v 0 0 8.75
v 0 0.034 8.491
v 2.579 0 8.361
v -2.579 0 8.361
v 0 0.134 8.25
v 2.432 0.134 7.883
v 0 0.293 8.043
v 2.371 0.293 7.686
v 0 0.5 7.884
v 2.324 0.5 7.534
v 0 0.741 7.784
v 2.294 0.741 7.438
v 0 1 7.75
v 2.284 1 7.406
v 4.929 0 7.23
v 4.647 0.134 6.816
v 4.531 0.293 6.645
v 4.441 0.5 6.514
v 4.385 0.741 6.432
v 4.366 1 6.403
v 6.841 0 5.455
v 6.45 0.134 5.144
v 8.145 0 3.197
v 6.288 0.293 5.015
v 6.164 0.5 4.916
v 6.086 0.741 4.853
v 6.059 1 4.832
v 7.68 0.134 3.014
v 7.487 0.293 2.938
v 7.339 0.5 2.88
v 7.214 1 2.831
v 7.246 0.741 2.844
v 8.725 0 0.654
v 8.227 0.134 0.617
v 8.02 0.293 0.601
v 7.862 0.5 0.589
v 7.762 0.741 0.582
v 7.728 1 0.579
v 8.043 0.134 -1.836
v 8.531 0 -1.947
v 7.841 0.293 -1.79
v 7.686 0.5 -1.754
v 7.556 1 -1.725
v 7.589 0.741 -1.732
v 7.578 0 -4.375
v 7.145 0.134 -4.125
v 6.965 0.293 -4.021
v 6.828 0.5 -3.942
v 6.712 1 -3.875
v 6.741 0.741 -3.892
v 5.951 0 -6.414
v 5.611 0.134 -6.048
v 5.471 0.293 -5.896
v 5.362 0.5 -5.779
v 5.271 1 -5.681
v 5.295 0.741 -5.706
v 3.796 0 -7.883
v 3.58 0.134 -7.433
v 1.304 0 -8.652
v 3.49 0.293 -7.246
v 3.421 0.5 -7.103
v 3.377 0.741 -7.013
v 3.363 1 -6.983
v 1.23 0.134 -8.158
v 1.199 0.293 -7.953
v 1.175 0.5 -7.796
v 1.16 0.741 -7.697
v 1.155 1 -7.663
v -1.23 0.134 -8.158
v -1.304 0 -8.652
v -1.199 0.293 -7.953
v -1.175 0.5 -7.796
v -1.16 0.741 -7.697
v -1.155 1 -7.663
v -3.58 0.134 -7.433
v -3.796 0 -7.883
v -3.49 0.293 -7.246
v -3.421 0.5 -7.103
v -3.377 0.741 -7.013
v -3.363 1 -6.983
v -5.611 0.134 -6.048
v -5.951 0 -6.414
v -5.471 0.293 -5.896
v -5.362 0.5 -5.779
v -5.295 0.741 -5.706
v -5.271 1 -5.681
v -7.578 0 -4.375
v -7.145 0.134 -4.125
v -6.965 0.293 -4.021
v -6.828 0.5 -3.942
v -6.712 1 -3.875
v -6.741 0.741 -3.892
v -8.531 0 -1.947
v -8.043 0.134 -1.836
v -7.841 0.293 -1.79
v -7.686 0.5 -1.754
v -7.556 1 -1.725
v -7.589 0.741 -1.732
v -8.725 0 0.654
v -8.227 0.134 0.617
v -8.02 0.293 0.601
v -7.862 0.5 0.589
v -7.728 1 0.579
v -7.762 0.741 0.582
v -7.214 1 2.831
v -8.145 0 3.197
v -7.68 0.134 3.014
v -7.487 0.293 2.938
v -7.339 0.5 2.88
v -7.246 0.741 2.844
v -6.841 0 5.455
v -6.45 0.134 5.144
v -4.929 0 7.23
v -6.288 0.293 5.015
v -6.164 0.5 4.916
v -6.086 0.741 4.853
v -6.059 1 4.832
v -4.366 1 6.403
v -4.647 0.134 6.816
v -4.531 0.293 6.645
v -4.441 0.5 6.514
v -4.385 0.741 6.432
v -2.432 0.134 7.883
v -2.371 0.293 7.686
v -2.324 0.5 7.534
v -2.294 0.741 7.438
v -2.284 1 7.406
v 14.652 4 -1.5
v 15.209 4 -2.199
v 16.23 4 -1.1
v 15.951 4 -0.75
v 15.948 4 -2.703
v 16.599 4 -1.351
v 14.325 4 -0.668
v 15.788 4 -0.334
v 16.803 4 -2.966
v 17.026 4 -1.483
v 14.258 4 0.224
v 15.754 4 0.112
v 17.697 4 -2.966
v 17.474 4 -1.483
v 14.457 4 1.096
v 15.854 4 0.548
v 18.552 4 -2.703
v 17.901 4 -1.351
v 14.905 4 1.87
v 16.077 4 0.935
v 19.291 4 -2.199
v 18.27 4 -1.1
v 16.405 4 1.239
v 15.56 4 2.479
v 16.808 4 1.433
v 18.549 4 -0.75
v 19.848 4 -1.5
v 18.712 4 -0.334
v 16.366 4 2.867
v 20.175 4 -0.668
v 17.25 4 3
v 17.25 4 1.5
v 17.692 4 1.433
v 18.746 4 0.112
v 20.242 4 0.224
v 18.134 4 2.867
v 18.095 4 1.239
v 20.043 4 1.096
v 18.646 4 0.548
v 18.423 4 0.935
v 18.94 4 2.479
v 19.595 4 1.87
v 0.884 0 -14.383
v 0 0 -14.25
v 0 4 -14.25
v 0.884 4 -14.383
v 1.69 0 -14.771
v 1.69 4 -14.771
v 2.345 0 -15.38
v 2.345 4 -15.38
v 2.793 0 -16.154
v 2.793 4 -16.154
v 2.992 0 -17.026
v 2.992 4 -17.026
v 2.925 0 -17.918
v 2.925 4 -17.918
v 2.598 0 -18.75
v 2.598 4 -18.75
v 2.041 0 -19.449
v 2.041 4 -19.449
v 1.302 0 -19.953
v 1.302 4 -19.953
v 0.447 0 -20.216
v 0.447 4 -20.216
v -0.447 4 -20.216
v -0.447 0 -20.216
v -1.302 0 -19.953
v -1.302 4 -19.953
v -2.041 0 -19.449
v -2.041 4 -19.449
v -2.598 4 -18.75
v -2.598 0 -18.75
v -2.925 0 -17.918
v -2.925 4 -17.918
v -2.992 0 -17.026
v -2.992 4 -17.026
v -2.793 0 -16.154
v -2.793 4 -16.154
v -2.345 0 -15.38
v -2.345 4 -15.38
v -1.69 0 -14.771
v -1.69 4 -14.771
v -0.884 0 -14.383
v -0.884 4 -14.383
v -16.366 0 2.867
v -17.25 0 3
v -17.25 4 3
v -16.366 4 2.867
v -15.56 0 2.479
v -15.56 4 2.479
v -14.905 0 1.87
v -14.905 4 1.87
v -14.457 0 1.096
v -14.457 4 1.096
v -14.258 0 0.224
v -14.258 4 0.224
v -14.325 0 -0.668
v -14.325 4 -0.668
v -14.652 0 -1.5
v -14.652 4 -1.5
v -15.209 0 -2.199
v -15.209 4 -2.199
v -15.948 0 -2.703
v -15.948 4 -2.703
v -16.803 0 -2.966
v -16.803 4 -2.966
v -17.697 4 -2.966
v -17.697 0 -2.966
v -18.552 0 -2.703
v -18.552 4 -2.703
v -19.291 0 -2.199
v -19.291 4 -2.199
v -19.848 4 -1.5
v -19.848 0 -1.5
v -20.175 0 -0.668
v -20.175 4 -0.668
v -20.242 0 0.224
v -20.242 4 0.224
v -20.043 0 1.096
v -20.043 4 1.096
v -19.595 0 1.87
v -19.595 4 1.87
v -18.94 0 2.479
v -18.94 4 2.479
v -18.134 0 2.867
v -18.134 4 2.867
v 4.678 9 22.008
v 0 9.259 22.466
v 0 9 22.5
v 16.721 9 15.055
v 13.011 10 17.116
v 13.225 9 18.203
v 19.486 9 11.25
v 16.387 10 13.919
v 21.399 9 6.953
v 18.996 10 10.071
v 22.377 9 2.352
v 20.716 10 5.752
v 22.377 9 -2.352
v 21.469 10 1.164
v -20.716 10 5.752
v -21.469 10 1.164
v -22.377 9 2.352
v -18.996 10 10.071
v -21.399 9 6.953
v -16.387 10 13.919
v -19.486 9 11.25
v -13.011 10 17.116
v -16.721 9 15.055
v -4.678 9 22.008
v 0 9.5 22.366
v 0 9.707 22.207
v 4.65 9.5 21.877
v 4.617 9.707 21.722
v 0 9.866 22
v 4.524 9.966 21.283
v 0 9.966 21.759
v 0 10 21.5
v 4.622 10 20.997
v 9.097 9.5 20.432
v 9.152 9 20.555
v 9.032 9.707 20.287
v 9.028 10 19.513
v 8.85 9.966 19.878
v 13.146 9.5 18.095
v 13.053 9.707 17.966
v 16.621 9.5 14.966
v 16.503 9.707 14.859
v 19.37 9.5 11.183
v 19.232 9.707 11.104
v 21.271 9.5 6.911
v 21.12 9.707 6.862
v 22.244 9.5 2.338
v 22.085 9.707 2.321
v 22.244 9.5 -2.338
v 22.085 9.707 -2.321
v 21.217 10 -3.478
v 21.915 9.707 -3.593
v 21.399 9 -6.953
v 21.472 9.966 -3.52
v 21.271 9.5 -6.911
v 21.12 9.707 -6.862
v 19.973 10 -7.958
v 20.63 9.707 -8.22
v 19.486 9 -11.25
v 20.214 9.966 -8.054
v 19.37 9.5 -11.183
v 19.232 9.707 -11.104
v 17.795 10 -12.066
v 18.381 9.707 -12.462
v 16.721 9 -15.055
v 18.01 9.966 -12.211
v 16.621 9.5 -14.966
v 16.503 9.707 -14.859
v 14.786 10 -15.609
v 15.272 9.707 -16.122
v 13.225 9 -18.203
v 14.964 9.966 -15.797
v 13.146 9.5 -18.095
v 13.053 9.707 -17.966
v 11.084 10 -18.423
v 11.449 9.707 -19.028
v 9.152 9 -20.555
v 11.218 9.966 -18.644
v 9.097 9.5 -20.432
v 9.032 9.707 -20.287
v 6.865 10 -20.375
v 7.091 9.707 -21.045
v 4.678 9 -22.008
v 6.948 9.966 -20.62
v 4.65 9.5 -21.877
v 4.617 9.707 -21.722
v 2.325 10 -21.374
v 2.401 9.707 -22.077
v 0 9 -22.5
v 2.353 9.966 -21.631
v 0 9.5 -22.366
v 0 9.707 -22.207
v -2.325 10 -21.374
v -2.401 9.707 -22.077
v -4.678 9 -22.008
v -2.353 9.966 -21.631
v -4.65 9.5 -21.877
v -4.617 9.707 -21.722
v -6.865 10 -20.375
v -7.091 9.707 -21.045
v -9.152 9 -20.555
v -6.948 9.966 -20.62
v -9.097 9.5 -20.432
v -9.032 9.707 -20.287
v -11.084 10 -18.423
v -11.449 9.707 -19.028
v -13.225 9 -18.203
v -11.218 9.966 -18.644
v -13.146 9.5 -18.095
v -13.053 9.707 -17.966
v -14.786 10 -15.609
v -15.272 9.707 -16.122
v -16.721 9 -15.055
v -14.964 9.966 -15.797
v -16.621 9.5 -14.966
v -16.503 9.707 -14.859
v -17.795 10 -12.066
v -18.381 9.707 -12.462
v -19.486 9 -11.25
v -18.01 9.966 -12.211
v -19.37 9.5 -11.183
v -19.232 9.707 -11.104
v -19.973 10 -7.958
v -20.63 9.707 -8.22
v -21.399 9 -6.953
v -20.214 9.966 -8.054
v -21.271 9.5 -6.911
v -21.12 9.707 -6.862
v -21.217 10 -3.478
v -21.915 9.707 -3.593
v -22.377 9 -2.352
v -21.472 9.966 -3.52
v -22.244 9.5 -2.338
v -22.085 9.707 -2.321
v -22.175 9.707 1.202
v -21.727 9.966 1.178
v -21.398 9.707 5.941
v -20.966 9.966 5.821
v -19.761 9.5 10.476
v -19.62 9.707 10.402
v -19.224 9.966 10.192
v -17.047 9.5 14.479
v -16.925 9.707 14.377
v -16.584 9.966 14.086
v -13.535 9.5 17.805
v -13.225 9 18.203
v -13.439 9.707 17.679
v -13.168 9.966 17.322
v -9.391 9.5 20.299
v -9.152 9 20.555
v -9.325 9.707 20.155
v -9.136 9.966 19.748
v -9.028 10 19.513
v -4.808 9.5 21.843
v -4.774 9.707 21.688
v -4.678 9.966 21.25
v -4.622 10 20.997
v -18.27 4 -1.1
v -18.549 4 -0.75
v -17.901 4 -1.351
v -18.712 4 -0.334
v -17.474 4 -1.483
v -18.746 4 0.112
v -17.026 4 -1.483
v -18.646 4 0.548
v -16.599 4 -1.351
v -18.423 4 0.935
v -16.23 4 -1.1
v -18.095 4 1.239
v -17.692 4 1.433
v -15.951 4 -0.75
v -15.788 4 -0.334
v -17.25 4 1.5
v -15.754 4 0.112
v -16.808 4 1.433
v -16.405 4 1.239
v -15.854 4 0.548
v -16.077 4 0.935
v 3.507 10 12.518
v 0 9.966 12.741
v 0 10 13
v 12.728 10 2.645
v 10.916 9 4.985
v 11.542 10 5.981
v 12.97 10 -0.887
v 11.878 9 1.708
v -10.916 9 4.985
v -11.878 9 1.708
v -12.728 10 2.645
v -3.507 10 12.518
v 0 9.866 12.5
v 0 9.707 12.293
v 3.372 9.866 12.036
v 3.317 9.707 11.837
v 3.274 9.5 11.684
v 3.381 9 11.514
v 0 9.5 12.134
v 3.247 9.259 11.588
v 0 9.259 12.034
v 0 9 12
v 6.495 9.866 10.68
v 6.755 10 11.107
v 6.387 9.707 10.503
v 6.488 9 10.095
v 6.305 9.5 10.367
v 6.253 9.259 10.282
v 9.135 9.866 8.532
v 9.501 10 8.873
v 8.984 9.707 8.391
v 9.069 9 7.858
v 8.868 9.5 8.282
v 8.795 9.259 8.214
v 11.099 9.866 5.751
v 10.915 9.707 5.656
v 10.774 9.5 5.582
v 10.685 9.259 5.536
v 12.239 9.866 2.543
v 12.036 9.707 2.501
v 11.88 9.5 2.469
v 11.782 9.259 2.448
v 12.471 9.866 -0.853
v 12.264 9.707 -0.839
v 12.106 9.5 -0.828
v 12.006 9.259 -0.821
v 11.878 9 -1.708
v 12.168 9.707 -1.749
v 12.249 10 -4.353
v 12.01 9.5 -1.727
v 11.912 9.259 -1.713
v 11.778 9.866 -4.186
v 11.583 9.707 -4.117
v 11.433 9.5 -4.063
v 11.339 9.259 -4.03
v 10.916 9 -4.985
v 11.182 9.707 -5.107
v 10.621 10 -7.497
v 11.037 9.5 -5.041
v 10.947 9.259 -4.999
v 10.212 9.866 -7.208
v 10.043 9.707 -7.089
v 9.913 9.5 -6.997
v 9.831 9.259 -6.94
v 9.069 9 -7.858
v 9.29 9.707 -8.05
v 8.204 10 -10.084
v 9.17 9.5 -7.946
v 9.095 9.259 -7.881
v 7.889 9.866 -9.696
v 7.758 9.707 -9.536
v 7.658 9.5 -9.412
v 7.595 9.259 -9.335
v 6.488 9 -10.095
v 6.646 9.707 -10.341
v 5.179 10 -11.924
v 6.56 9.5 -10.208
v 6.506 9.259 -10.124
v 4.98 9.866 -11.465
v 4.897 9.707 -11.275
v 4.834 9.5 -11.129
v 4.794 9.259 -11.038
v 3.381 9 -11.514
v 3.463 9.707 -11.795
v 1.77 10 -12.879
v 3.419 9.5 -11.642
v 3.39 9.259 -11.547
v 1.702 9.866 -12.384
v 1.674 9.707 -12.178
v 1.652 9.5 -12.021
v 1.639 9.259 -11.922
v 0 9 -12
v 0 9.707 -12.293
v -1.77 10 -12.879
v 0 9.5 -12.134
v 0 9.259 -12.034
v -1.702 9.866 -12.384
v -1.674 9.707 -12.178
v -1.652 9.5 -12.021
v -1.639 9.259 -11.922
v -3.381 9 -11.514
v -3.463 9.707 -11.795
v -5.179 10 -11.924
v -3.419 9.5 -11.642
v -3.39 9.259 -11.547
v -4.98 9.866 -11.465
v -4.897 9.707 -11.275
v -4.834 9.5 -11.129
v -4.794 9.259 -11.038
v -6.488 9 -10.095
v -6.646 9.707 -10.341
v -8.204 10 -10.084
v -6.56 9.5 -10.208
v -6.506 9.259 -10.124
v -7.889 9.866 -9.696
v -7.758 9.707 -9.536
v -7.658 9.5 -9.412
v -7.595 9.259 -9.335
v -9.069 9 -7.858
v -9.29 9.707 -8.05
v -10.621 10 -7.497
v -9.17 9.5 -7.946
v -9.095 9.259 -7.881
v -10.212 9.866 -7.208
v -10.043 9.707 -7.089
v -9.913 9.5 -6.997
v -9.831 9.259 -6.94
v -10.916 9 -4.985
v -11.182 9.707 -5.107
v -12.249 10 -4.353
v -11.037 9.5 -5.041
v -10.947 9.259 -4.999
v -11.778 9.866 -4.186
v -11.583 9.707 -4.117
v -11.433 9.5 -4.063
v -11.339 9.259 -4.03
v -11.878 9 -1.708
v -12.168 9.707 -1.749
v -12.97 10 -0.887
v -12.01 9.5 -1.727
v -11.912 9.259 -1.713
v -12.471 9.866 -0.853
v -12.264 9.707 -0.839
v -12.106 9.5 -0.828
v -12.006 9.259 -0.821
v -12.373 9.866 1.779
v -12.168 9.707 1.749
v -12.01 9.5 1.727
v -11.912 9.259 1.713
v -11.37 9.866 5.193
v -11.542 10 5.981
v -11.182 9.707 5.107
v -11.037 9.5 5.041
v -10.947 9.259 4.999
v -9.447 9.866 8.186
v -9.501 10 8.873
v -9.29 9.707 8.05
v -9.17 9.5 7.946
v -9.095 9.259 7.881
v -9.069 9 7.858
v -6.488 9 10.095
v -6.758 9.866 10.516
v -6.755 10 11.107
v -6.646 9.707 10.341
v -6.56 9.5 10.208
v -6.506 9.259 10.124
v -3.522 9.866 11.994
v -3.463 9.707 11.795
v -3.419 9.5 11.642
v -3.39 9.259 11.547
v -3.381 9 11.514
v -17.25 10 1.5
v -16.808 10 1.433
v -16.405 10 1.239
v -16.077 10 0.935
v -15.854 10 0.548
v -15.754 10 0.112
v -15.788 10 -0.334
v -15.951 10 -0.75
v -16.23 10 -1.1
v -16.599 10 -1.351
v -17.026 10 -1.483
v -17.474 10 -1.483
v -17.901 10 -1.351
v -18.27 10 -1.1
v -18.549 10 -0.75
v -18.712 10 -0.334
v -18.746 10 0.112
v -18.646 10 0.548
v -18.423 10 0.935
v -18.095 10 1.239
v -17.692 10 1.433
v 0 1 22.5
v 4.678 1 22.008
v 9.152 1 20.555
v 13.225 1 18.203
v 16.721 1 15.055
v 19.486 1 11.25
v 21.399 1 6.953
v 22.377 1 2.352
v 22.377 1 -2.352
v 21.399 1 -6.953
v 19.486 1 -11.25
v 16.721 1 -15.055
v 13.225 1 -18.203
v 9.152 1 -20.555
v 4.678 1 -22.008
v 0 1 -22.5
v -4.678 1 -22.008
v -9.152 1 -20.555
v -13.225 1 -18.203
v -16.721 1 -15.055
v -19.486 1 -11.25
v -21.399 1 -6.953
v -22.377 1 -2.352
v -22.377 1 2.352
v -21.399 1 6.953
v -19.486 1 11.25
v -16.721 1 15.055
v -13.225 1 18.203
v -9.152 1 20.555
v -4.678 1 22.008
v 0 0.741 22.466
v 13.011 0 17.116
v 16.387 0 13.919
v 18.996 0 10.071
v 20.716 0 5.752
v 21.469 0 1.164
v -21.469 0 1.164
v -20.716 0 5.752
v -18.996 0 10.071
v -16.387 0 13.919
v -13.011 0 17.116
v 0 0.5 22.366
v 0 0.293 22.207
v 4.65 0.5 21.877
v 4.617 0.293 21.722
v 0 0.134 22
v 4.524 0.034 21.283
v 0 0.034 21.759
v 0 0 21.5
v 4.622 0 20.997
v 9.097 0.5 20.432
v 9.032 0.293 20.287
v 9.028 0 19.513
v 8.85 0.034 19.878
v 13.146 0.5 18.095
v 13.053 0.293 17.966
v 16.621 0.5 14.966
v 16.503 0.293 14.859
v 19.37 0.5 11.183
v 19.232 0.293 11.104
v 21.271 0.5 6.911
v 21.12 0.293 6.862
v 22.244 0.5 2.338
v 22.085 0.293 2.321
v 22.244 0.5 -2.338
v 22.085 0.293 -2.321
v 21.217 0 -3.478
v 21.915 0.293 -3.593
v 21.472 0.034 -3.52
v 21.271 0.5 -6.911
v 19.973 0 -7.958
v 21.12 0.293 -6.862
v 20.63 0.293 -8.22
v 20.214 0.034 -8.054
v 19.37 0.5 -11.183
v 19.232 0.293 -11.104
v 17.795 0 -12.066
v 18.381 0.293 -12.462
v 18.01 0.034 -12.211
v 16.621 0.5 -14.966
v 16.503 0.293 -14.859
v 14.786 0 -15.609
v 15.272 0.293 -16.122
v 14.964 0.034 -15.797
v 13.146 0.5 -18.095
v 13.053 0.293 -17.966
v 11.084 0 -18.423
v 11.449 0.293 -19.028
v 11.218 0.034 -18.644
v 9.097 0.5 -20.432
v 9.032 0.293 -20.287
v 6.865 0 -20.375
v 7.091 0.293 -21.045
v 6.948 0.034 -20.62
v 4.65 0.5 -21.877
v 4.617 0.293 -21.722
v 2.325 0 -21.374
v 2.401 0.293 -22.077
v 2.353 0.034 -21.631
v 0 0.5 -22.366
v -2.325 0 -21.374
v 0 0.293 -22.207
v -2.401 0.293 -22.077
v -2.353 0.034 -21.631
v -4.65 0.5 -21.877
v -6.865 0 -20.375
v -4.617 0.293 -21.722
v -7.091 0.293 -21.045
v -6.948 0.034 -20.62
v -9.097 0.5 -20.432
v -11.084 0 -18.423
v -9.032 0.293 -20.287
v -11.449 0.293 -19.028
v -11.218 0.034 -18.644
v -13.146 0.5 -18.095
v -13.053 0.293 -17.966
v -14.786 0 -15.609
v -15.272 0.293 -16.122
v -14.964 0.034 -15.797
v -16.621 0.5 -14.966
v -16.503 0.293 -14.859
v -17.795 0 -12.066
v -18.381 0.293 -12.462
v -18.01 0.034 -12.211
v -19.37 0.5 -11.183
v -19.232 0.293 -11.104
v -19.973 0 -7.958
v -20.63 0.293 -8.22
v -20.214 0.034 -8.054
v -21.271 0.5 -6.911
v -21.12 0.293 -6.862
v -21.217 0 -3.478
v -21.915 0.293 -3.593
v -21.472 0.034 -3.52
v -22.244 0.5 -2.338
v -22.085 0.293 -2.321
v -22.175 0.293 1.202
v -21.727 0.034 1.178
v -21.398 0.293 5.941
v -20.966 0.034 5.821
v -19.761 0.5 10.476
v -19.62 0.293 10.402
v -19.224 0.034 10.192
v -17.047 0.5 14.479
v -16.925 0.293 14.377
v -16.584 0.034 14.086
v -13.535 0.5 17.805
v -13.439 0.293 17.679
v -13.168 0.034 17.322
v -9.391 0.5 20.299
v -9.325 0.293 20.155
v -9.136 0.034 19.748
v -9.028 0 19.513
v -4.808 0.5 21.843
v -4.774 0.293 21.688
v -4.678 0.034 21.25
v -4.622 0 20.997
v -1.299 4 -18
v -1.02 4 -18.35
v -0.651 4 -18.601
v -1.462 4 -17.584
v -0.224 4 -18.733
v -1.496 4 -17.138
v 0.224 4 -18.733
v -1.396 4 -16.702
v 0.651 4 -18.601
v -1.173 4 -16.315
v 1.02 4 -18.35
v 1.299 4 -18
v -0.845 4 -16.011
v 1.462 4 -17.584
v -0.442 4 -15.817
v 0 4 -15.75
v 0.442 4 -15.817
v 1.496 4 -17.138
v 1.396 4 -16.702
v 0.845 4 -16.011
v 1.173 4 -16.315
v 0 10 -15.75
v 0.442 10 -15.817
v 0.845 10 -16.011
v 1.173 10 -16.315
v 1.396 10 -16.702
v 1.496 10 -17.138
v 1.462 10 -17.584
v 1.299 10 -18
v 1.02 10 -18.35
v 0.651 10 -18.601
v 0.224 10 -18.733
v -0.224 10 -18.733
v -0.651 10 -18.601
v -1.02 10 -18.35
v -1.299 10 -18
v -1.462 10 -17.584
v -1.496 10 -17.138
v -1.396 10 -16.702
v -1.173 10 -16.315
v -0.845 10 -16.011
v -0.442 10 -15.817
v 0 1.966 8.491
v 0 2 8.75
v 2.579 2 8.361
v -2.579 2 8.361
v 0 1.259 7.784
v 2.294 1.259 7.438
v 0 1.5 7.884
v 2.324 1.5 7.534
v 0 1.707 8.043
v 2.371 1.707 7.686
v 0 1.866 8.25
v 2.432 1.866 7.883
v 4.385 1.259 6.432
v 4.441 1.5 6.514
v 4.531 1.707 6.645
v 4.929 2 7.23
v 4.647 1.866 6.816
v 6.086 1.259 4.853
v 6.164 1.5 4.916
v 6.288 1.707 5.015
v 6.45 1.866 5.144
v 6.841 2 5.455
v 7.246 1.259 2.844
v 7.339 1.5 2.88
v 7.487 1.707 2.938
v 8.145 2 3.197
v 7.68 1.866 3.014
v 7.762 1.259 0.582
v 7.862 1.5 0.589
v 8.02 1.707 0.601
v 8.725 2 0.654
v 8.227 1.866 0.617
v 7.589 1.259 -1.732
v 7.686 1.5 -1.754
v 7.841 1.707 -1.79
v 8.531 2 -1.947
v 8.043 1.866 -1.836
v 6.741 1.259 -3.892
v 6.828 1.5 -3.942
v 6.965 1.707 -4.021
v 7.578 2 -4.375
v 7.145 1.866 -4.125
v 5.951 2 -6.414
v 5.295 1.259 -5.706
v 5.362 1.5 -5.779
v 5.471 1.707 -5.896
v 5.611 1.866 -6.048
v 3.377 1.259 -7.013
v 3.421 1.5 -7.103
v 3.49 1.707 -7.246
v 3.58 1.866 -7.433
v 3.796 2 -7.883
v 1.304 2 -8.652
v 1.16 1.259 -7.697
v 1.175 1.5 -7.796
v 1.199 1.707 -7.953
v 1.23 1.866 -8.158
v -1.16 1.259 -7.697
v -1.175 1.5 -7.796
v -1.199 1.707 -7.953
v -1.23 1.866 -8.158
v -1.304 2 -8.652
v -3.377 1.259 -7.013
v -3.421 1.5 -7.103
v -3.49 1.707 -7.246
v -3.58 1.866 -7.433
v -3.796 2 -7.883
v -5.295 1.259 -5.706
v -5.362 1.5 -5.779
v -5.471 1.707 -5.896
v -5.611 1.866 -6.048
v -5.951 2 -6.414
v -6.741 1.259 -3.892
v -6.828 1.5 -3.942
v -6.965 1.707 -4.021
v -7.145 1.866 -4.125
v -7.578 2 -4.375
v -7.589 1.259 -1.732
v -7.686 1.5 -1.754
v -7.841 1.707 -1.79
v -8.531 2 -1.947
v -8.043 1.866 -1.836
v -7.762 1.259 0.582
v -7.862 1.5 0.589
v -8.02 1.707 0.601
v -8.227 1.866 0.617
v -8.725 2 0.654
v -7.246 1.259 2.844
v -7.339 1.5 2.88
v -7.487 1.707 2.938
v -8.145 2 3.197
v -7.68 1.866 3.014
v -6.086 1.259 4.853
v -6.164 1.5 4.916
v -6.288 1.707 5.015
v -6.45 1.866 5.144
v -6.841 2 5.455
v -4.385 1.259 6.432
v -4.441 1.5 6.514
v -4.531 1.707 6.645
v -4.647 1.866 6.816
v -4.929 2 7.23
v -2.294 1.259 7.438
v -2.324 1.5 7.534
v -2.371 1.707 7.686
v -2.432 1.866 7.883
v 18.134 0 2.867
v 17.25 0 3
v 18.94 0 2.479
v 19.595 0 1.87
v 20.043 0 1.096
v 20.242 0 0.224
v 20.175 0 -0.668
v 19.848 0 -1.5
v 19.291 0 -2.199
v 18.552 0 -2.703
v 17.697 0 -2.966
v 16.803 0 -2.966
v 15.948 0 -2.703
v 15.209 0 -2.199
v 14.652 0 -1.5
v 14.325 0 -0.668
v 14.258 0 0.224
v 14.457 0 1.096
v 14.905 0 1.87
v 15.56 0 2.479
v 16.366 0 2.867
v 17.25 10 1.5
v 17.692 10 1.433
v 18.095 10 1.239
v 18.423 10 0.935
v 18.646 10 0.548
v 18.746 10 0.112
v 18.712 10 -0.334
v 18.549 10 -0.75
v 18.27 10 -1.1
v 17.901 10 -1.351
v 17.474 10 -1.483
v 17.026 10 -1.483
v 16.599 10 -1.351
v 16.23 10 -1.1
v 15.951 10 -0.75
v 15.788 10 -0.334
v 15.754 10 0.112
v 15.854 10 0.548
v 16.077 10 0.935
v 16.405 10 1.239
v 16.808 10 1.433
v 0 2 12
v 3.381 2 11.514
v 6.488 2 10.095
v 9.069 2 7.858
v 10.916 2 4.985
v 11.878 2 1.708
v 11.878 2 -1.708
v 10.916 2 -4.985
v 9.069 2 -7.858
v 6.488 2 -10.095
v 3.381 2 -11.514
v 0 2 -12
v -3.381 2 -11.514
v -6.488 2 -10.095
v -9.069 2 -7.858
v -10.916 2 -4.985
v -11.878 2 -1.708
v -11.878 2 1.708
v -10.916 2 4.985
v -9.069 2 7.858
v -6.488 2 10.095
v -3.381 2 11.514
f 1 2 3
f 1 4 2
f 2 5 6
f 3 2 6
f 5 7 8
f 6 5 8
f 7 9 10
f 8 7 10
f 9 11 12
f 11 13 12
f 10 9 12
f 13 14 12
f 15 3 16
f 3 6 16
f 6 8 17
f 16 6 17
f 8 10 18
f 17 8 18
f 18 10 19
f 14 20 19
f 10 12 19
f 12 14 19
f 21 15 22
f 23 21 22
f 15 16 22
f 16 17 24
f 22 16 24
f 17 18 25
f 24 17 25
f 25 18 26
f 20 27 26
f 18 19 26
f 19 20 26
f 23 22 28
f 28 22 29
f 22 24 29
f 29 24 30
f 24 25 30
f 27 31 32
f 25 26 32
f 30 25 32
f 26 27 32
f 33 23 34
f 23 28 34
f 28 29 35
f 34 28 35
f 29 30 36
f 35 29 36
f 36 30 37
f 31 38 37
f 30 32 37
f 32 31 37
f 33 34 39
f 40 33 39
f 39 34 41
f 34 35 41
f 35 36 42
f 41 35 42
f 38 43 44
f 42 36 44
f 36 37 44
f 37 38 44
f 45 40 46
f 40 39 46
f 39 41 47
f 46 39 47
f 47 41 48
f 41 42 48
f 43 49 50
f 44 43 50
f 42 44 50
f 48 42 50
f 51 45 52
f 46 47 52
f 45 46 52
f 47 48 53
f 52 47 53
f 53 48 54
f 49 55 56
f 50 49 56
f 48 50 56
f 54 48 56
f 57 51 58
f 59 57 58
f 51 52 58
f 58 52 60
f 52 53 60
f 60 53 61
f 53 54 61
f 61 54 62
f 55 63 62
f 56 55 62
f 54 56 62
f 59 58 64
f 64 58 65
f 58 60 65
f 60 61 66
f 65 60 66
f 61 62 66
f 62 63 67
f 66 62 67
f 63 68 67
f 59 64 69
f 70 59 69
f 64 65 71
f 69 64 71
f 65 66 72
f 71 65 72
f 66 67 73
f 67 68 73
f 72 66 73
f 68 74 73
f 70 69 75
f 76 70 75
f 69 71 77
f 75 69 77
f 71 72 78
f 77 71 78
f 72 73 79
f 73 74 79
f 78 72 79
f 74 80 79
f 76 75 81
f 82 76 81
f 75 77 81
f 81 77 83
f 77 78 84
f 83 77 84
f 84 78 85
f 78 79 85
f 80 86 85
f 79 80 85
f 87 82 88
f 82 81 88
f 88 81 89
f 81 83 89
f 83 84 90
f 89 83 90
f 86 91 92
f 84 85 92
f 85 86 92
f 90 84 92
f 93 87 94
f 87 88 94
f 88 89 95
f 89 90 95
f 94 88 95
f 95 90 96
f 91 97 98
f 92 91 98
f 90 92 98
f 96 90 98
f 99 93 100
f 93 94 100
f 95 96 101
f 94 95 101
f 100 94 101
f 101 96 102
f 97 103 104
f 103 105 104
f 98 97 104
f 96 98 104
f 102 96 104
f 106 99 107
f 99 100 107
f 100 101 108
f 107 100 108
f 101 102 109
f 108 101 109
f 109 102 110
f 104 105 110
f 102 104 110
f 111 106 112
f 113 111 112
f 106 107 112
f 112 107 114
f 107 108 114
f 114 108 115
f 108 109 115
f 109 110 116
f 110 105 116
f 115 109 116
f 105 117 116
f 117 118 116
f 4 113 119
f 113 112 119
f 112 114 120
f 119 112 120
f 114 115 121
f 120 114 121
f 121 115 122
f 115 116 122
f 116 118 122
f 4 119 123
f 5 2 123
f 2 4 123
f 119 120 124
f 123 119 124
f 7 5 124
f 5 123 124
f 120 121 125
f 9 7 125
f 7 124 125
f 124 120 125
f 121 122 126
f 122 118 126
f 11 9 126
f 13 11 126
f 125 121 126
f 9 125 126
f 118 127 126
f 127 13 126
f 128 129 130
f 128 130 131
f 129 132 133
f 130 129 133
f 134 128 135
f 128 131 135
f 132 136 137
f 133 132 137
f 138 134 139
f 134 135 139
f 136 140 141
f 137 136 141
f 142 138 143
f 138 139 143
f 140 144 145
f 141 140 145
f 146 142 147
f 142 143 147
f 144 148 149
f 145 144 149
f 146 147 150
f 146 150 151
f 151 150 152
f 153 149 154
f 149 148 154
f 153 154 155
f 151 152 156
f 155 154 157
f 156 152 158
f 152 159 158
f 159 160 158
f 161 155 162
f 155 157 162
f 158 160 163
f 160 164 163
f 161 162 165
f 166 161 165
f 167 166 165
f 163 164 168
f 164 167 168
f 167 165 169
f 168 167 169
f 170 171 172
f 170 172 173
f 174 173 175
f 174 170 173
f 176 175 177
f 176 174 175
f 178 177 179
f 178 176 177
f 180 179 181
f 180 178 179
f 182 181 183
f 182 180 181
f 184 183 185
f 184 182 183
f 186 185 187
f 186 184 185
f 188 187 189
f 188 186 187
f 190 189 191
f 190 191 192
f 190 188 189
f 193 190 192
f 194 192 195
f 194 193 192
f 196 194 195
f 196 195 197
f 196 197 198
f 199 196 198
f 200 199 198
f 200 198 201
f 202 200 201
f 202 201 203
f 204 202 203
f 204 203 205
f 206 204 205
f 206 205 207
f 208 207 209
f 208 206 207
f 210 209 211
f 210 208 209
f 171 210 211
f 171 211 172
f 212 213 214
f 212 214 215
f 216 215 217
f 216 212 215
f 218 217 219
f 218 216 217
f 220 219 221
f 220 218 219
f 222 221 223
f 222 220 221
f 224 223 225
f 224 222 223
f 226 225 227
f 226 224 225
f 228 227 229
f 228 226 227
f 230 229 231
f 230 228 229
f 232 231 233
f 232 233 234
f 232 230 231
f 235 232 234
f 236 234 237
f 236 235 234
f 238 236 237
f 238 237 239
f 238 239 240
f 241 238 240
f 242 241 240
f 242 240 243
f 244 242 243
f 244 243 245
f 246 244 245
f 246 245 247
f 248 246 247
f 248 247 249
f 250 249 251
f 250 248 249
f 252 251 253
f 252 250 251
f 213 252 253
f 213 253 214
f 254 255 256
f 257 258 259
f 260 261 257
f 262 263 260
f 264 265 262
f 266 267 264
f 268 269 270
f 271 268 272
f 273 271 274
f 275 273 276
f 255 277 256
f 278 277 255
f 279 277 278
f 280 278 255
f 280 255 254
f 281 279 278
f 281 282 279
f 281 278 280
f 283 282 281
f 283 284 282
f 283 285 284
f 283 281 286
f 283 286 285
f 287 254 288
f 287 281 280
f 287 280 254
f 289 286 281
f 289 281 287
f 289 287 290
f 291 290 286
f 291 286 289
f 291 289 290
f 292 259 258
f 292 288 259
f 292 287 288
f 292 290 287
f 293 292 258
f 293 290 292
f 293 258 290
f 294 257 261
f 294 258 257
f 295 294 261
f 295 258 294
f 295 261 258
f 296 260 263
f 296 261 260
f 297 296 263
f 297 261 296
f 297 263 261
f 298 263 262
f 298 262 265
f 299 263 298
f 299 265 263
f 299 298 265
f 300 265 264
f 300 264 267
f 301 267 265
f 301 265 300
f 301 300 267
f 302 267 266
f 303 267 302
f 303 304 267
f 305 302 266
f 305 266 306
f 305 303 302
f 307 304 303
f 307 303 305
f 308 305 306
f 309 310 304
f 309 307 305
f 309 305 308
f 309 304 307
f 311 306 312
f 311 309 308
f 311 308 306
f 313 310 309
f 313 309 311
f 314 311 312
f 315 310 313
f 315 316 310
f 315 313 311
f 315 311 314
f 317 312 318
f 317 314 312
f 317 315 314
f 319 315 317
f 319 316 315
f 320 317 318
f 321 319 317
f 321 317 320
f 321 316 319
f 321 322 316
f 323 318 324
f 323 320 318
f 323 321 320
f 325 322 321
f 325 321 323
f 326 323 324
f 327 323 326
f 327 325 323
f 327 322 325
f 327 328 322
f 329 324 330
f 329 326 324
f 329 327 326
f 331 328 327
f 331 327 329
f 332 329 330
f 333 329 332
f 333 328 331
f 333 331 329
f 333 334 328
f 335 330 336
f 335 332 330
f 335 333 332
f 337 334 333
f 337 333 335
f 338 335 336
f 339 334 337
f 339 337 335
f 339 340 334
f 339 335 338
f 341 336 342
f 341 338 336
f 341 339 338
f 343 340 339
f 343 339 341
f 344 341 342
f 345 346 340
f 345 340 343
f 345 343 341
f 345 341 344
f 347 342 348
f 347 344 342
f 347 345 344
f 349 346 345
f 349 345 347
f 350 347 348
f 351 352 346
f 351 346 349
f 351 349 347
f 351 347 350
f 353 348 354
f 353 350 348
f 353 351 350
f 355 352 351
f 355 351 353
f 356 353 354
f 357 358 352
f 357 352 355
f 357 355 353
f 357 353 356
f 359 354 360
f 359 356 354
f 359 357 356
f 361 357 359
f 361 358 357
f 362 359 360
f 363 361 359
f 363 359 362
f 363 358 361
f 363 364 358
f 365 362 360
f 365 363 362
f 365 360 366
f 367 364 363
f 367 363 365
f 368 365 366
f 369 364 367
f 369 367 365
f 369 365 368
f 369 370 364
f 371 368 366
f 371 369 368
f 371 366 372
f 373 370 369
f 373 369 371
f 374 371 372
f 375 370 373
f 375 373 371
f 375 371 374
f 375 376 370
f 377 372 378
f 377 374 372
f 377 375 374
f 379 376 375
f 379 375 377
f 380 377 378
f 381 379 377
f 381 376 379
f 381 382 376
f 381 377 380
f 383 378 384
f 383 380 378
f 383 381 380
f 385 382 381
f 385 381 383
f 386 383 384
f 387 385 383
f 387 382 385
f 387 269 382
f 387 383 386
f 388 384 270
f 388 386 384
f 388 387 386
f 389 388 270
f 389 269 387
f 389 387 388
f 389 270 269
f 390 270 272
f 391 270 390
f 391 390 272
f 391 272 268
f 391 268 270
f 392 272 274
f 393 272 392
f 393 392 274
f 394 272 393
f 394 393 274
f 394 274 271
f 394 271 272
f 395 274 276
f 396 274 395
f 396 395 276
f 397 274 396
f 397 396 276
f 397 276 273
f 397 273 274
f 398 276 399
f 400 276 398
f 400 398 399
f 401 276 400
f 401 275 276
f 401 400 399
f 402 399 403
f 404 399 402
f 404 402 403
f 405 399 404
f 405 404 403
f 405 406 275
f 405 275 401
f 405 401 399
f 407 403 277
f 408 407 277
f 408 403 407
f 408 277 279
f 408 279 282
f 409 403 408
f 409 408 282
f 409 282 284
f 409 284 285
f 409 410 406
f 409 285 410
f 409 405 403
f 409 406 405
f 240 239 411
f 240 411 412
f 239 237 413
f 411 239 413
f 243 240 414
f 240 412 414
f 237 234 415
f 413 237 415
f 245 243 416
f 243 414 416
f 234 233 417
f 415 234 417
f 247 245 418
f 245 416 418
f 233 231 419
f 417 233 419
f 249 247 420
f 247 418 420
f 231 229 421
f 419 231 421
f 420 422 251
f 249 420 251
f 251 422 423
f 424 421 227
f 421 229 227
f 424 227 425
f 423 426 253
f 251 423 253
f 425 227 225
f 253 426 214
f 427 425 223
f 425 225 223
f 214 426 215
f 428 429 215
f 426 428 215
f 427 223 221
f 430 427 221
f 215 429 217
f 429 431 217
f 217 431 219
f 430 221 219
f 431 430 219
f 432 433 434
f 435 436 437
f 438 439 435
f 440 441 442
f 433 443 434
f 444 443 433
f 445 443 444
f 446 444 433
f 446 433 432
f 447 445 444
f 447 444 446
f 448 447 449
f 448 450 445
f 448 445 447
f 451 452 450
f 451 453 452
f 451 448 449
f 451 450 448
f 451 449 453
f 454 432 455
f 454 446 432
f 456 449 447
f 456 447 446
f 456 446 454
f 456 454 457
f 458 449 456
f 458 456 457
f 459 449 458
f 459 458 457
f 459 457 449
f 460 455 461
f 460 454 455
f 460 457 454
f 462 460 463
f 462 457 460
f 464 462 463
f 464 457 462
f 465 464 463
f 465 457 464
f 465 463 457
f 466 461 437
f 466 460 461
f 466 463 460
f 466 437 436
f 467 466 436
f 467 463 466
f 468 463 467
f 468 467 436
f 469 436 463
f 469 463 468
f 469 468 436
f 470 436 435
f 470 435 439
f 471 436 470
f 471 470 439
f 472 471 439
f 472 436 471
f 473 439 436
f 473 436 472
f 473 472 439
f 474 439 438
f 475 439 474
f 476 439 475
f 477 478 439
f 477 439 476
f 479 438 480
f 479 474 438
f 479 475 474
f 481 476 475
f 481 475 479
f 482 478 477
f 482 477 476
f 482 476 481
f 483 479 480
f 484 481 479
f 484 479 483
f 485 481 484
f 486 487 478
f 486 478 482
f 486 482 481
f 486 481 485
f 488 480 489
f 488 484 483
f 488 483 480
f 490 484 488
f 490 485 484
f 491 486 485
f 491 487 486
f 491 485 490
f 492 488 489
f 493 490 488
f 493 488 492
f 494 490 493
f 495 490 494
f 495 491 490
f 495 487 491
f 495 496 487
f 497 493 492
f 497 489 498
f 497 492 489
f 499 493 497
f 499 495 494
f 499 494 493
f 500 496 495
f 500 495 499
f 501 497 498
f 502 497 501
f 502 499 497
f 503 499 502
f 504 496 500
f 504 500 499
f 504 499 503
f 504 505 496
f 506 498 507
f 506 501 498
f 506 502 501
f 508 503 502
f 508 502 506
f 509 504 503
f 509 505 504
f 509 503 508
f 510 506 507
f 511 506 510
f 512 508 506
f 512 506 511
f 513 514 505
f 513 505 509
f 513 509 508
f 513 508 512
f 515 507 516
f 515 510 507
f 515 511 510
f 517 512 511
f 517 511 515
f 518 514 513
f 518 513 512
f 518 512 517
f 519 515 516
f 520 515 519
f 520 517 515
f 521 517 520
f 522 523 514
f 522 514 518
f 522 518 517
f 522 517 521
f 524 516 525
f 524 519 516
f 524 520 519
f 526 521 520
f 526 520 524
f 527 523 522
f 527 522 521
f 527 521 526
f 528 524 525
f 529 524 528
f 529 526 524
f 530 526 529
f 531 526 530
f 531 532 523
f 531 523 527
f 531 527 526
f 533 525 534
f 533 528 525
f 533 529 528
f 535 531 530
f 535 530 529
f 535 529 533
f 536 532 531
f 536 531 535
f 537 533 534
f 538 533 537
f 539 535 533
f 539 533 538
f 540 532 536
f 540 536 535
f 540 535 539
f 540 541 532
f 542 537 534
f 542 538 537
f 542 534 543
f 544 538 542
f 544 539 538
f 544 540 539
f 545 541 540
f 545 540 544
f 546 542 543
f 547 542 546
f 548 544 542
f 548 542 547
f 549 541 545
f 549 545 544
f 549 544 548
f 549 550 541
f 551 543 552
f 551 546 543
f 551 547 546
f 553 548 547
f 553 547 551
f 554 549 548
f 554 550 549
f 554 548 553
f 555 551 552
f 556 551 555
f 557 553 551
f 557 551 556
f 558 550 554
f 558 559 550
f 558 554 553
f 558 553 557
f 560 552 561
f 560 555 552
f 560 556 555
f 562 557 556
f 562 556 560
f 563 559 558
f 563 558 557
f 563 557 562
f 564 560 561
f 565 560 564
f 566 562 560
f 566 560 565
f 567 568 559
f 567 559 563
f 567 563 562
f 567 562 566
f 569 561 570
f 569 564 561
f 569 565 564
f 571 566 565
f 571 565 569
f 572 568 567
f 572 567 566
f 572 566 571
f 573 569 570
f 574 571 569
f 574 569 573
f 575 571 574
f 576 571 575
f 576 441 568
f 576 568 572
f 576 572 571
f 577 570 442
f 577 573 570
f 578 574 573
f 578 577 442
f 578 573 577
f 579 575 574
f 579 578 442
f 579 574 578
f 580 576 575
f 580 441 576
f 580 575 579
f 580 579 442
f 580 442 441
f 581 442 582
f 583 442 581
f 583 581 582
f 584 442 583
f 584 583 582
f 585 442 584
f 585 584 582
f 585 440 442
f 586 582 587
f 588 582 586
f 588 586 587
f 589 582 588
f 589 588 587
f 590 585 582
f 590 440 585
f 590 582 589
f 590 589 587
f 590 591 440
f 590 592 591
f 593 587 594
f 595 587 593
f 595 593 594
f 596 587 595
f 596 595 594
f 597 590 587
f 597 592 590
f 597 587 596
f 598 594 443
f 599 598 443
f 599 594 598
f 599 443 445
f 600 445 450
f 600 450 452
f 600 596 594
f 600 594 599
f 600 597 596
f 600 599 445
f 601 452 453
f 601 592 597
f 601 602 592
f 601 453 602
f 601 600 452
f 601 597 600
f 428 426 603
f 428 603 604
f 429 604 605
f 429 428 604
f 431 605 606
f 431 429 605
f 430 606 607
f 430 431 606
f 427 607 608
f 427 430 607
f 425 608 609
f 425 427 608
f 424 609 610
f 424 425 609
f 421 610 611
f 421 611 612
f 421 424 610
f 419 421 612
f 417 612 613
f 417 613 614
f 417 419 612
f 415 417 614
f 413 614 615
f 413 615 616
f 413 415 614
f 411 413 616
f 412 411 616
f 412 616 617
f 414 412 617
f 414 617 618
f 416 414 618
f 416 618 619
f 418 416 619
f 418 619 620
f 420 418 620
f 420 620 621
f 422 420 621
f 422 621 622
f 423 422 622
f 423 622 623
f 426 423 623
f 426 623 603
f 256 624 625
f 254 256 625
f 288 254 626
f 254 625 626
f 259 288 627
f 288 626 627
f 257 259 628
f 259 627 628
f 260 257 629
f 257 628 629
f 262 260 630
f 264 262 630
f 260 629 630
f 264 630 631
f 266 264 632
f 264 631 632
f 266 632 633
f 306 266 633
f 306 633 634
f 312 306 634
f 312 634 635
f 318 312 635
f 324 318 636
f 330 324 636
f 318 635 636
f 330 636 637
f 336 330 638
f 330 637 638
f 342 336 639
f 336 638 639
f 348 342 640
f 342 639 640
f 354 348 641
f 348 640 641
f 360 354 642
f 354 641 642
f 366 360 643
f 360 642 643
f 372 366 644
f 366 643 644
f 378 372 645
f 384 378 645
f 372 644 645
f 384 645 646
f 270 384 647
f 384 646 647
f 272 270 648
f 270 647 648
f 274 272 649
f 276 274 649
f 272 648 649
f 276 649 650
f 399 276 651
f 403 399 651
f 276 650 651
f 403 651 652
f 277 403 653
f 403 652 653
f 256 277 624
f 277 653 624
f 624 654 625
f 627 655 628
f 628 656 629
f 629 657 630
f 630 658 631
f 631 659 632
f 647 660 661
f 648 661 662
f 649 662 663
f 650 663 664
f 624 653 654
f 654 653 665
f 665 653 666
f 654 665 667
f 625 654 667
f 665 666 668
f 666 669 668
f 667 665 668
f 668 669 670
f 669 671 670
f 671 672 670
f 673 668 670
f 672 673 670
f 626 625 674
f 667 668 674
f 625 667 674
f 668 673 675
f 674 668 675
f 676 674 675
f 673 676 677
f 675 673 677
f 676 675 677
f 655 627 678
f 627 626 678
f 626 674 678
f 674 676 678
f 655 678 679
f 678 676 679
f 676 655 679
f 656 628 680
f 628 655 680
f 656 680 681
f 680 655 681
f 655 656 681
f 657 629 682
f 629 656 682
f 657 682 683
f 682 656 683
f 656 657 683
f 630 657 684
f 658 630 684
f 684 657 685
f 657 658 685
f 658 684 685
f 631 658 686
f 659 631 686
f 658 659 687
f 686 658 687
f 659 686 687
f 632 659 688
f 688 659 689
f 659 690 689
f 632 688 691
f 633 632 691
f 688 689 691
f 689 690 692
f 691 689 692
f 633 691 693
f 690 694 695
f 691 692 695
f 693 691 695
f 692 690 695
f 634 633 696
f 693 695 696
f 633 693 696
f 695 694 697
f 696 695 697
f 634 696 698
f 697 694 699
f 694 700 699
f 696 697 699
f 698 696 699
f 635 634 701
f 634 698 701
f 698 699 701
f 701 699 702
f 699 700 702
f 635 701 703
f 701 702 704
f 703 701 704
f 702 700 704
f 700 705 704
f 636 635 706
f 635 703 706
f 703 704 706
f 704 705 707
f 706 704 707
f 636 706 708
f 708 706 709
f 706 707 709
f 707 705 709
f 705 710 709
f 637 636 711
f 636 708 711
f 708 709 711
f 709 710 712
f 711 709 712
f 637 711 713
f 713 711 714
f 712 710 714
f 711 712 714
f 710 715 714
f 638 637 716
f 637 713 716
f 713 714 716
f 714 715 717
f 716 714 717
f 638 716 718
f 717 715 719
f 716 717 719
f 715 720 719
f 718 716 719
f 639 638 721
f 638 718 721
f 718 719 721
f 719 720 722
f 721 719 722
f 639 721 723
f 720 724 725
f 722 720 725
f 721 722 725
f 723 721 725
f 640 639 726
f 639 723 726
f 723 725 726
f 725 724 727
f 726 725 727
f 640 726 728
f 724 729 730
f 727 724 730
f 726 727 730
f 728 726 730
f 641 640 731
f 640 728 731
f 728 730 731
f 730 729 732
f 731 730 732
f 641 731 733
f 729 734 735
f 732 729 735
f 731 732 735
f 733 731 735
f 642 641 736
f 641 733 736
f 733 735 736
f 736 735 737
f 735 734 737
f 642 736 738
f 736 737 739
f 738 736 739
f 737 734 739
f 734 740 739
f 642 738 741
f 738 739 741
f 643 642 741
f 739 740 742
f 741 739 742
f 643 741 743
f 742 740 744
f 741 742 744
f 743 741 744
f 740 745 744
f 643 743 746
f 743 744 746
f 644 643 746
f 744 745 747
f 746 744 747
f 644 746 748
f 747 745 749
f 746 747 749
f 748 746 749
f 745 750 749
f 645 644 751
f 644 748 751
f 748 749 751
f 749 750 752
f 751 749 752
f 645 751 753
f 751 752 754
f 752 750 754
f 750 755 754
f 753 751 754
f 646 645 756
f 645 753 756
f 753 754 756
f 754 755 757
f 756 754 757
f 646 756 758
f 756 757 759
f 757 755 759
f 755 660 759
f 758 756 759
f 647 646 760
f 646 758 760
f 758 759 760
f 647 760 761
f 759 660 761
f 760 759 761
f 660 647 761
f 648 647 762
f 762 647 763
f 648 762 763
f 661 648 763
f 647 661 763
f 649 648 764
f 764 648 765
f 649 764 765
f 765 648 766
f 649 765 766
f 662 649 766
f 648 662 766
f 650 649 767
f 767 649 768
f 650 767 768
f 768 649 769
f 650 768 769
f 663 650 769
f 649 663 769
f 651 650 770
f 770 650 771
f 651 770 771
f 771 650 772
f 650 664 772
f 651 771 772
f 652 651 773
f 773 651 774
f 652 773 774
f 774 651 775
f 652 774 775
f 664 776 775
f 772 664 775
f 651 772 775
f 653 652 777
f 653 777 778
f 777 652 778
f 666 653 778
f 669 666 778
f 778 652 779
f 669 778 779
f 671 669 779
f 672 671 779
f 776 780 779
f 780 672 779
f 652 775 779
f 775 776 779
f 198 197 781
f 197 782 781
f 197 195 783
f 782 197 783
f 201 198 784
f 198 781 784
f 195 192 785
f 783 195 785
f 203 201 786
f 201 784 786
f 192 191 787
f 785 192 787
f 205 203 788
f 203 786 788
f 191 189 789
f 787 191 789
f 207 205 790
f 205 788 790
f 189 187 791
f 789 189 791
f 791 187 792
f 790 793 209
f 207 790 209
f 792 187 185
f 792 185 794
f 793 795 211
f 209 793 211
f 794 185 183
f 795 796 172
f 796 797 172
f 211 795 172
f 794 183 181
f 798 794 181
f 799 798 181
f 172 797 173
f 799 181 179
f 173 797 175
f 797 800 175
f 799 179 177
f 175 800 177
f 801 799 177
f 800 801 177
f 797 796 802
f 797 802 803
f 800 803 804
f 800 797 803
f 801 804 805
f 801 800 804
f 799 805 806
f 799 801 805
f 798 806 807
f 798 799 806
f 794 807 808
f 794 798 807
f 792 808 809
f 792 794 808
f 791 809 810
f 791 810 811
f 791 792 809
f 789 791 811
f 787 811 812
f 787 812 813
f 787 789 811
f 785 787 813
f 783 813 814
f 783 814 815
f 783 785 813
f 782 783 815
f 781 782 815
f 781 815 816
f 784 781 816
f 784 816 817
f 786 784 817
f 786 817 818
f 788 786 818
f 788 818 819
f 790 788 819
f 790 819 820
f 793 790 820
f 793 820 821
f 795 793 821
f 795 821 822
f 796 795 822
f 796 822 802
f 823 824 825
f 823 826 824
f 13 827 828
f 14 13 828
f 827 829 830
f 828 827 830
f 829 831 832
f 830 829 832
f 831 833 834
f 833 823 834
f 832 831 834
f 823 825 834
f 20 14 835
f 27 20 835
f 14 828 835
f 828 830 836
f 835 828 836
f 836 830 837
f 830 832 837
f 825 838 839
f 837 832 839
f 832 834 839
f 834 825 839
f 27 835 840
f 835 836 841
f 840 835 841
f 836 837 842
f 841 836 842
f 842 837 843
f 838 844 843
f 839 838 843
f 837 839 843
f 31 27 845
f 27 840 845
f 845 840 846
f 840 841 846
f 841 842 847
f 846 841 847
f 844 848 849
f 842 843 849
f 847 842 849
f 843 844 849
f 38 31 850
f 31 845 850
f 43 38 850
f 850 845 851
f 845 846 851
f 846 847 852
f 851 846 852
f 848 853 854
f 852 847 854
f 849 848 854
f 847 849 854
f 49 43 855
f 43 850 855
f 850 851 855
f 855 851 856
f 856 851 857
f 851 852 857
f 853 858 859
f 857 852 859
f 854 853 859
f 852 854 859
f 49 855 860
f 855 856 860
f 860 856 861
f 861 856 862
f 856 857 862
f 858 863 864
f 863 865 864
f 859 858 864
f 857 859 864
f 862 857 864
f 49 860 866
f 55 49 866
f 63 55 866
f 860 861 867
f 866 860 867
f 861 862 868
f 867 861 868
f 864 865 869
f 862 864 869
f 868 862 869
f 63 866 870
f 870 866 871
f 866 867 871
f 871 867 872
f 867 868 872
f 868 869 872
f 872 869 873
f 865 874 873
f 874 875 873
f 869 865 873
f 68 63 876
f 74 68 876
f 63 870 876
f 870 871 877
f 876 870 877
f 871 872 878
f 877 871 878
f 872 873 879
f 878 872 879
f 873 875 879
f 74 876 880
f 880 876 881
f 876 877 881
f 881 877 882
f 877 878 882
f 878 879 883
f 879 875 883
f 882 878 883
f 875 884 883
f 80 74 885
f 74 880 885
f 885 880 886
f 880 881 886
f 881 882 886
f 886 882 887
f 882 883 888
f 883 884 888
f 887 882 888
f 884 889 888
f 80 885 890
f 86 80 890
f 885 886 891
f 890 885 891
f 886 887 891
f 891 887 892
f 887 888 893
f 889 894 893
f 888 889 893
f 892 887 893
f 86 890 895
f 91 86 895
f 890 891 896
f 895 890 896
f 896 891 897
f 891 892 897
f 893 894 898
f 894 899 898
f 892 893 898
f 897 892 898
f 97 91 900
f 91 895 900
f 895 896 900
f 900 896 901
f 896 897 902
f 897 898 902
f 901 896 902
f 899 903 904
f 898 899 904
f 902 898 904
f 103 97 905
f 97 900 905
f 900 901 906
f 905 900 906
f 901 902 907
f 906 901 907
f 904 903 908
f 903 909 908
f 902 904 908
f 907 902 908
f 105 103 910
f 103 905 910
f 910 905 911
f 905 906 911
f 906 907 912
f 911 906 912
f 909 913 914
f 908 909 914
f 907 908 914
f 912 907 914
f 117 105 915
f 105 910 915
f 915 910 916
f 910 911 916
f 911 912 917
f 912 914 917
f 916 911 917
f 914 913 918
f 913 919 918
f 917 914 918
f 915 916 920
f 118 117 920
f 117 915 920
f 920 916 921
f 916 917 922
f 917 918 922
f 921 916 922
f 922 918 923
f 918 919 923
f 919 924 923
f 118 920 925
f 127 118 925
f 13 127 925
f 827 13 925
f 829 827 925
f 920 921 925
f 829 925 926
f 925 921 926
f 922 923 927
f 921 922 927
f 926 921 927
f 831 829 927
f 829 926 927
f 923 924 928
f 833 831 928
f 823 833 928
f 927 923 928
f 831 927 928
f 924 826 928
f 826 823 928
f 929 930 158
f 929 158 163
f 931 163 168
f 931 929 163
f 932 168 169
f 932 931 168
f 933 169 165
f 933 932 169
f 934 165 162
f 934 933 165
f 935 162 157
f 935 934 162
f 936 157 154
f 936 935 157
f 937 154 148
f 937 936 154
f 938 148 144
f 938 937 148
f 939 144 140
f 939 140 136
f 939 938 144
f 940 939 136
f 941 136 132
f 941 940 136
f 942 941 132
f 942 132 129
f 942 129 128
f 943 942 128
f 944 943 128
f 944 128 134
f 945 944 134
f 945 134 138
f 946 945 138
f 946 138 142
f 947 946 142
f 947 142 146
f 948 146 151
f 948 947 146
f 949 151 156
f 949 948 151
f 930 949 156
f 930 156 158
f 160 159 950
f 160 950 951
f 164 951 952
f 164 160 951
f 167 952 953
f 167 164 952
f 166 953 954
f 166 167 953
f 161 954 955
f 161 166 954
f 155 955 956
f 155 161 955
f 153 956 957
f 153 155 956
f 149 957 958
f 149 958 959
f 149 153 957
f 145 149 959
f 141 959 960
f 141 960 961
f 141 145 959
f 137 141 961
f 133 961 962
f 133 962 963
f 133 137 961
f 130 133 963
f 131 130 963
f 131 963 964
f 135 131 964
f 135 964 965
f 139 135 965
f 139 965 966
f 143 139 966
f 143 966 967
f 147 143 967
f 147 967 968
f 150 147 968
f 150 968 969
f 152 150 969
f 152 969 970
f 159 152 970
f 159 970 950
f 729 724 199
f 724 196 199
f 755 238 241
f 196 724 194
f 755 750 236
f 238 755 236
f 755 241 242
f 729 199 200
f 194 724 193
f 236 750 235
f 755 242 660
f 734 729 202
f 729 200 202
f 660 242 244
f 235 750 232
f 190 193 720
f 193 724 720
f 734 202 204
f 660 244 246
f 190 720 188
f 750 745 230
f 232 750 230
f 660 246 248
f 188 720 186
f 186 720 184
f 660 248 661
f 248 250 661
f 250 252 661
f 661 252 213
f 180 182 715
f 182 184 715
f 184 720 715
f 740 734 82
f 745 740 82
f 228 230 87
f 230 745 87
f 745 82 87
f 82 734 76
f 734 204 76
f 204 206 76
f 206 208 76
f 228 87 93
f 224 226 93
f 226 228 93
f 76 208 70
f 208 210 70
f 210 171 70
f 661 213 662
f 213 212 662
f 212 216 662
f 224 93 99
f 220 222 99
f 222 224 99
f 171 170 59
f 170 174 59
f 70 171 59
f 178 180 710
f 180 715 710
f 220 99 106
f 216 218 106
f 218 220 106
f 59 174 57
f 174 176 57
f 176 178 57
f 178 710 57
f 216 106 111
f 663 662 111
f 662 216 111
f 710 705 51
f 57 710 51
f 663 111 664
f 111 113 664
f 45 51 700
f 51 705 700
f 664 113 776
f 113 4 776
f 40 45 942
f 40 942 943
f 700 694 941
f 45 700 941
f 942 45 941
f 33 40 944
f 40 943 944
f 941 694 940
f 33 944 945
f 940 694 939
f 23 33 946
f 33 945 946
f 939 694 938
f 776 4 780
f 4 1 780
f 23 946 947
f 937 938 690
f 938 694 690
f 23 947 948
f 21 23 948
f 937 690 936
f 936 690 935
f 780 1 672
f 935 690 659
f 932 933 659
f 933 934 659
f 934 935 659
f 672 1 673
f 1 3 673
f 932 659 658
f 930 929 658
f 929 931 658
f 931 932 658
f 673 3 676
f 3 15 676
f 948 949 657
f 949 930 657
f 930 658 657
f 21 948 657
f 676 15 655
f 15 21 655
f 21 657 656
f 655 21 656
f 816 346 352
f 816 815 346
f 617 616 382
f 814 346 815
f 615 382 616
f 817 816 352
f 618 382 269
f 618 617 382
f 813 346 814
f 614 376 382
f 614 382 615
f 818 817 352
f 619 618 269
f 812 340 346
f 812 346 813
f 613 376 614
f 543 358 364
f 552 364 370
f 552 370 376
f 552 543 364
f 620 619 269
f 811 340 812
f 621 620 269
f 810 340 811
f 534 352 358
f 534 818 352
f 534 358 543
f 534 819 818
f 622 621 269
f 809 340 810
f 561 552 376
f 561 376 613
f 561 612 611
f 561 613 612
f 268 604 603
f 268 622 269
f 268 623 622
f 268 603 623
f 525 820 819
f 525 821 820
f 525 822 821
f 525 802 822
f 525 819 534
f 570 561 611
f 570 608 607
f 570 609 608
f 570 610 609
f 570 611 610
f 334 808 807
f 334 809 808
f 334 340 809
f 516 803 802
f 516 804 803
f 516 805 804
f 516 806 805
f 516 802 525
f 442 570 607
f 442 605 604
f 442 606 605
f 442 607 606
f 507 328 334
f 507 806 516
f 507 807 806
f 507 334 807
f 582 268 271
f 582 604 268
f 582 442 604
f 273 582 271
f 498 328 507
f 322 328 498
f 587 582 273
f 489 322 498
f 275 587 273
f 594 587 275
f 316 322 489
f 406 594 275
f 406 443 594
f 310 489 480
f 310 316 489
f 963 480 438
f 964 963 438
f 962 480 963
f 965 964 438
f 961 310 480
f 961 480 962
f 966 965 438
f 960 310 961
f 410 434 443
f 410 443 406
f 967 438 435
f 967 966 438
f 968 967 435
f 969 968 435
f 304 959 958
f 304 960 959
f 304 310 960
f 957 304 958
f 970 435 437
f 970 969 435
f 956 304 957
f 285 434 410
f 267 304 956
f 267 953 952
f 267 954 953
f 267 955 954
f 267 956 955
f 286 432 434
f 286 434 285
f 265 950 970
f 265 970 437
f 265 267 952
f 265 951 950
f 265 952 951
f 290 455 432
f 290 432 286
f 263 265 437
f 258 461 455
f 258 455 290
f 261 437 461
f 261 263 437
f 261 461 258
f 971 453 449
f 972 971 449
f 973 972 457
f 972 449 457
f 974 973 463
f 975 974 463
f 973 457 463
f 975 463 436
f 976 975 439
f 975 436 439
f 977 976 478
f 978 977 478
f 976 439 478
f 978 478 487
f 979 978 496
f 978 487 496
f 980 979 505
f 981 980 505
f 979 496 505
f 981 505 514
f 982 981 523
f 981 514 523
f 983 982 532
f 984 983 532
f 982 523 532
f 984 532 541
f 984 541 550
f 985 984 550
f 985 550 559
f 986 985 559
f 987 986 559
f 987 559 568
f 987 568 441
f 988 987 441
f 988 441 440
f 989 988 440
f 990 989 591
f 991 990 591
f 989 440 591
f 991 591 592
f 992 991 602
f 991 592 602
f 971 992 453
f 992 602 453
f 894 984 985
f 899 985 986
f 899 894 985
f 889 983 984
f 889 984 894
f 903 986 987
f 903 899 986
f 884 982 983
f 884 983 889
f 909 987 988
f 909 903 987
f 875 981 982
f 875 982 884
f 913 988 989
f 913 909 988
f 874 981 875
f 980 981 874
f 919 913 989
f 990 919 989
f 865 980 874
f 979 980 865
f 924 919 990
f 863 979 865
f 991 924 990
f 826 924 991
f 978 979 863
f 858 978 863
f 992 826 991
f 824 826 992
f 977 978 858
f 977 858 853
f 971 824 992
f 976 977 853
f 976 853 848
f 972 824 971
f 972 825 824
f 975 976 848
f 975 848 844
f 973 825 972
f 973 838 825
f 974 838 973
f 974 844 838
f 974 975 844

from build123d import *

# Parameters (mm, degrees)
SKETCH1_R           = 22.5
SKETCH1_R_2         = 1.5
BOSS_EXTRUDE1_DEPTH = 10
SKETCH2_R           = 12
CUT_EXTRUDE1_DEPTH  = 8
SKETCH3_R           = 7.75
CUT_EXTRUDE2_DEPTH  = 8
FILLET1_R           = 1
SKETCH4_R           = 3
CUT_EXTRUDE4_DEPTH  = 4


with BuildPart() as part:
    # Sketch1 → Boss-Extrude1 (new body)
    with BuildSketch(Plane(origin=(0, 0, 0), x_dir=(1, 0, 0), z_dir=(0, 1, 0))):
        with Locations(Location((0, 0, 0), (0, 0, 270))):
            Circle(SKETCH1_R)
        with Locations(Location((-17.25, 0, 0), (0, 0, 270))):
            Circle(SKETCH1_R_2, mode=Mode.SUBTRACT)
        with Locations(Location((0, 17.25, 0), (0, 0, 270))):
            Circle(SKETCH1_R_2, mode=Mode.SUBTRACT)
        with Locations(Location((17.25, 0, 0), (0, 0, 270))):
            Circle(SKETCH1_R_2, mode=Mode.SUBTRACT)
    extrude(amount=BOSS_EXTRUDE1_DEPTH)

    # Sketch2 → Cut-Extrude1 (cut)
    with BuildSketch(Plane(origin=(0, 10, 0), x_dir=(1, 0, 0), z_dir=(0, 1, 0))):
        with Locations(Location((0, 0, 0), (0, 0, 270))):
            Circle(SKETCH2_R)
    extrude(amount=-CUT_EXTRUDE1_DEPTH, mode=Mode.SUBTRACT)

    # Sketch3 → Cut-Extrude2 (cut)
    with BuildSketch(Plane(origin=(0, 2, 0), x_dir=(1, 0, 0), z_dir=(0, 1, 0))):
        with Locations(Location((0, 0, 0), (0, 0, 270))):
            Circle(SKETCH3_R)
    extrude(amount=-CUT_EXTRUDE2_DEPTH, mode=Mode.SUBTRACT)

    # Fillet1
    fillet1_edges = [part.edges().sort_by_distance(p)[0] for p in [
        (0, 10, -12),
        (0, 0, -7.75),
        (0, 2, -7.75),
        (0, 10, -22.5),
        (0, 0, -22.5),
    ]]
    fillet(fillet1_edges, radius=FILLET1_R - 0.0001)  # a hair under: the kernel refuses the full size

    # Sketch4 → Cut-Extrude4 (cut)
    with BuildSketch(Plane(origin=(0, 0, 0), x_dir=(1, 0, 0), z_dir=(0, 1, 0))):
        with Locations(Location((-17.25, 0, 0), (0, 0, 270))):
            Circle(SKETCH4_R)
        with Locations(Location((0, 17.25, 0), (0, 0, 270))):
            Circle(SKETCH4_R)
        with Locations(Location((17.25, 0, 0), (0, 0, 270))):
            Circle(SKETCH4_R)
    extrude(amount=CUT_EXTRUDE4_DEPTH, mode=Mode.SUBTRACT)


solid = part.part
